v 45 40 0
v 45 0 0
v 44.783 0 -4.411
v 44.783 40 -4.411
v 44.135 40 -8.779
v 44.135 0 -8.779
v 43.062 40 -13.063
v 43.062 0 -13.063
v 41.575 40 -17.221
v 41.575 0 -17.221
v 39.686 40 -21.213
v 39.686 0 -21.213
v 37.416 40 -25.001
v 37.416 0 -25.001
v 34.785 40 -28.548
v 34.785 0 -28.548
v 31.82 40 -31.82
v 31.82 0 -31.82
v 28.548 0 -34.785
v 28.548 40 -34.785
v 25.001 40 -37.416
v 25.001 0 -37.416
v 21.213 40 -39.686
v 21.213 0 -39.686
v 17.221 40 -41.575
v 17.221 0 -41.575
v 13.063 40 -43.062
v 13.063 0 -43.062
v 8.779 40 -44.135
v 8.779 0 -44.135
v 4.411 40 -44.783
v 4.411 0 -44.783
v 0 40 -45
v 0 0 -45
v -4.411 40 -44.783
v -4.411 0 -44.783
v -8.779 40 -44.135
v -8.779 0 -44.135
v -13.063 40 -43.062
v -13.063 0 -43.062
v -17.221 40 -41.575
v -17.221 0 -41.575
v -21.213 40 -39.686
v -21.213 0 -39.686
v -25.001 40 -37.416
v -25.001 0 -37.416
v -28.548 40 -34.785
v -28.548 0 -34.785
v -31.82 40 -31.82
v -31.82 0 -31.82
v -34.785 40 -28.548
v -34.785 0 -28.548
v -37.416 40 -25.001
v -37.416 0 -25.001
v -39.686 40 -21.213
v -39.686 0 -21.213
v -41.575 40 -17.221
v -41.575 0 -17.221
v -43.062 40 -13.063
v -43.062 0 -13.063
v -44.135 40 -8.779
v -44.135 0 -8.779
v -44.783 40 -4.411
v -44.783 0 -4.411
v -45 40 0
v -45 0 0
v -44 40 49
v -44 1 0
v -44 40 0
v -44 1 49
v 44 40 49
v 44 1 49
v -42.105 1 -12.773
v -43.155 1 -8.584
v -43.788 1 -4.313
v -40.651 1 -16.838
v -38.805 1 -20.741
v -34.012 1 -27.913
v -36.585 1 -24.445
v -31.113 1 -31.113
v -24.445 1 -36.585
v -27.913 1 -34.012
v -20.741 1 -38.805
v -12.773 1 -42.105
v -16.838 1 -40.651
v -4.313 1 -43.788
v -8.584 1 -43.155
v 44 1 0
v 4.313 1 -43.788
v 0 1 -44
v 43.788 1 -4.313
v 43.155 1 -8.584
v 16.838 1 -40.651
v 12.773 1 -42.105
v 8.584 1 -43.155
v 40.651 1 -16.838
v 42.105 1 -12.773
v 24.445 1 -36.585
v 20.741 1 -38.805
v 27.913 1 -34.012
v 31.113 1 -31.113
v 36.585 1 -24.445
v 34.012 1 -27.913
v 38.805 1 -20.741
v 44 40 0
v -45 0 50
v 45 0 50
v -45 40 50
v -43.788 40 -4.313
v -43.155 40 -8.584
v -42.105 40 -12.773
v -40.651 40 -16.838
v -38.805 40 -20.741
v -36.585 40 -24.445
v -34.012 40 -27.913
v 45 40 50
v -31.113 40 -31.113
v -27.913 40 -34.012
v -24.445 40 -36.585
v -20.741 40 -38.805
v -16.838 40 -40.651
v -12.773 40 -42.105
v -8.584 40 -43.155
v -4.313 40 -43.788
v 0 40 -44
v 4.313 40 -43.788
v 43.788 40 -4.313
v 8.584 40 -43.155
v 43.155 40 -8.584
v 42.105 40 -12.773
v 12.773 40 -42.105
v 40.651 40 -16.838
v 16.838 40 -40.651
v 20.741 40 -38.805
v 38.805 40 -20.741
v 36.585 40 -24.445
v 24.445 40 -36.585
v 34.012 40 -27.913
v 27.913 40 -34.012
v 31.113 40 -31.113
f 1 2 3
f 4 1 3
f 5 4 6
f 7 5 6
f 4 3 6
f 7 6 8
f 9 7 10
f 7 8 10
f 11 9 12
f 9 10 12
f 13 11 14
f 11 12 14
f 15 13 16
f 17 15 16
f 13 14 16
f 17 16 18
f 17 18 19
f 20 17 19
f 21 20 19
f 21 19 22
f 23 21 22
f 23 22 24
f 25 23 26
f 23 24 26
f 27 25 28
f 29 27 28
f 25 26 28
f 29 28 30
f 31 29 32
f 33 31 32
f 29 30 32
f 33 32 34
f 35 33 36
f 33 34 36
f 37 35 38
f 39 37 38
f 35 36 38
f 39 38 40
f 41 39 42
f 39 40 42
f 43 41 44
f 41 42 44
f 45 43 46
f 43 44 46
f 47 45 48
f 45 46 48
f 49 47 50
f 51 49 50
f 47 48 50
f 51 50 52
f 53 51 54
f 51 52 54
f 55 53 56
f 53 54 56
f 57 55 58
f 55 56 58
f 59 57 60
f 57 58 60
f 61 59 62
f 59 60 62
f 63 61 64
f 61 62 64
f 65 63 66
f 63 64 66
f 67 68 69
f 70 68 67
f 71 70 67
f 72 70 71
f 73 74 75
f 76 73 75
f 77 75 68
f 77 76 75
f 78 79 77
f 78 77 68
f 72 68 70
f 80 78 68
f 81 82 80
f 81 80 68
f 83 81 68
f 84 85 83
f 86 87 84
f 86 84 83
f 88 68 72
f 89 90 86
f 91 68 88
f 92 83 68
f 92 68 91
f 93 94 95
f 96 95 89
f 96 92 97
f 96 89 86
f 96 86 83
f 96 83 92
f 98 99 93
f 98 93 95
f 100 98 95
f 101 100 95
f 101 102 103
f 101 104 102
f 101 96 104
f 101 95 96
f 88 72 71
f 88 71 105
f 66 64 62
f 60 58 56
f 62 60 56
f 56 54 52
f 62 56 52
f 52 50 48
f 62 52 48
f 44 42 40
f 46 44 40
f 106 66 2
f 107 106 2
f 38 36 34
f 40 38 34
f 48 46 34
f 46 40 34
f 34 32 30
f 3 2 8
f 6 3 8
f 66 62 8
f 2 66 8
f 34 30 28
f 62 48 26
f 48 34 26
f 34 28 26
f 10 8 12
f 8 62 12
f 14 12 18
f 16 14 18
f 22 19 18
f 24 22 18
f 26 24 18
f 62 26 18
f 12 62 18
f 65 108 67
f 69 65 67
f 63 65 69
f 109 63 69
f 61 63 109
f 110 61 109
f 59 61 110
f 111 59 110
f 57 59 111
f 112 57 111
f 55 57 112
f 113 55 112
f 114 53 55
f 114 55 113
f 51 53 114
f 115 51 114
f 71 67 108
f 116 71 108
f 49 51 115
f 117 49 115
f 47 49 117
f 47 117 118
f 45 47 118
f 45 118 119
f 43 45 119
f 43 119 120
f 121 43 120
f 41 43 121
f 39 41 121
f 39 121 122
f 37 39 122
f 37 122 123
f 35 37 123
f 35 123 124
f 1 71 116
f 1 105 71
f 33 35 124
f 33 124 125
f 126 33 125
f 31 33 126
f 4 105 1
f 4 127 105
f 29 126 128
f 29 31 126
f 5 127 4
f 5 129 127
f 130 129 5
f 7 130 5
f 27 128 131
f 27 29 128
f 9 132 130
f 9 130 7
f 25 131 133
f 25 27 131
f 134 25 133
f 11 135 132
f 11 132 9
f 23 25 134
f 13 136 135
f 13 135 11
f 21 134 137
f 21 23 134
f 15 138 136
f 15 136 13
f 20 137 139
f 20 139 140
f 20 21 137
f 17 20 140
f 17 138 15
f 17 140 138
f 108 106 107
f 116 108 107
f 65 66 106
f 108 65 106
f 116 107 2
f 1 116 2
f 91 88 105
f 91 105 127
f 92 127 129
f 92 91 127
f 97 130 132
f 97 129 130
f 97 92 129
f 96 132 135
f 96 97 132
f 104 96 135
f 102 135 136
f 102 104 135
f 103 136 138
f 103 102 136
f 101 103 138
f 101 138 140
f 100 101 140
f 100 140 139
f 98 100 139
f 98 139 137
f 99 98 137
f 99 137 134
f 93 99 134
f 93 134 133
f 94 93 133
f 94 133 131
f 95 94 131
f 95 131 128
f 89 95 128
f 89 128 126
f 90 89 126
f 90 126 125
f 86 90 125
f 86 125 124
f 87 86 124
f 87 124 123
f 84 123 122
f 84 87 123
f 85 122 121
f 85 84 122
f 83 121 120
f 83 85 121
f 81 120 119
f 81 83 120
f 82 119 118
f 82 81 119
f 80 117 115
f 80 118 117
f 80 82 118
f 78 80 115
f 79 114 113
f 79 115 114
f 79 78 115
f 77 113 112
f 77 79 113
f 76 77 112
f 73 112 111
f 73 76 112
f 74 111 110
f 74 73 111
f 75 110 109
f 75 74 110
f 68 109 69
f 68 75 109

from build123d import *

# Parameters (mm, degrees)
BOSS_EXTRUDE1_DEPTH = 40
SHELL1_T            = -1


with BuildPart() as part:
    # Sketch1 → Boss-Extrude1 (new body)
    with BuildSketch(Plane(origin=(0, 0, 0), x_dir=(1, 0, 0), z_dir=(0, 1, 0))):
        with BuildLine():
            Line((-45, 0), (-45, -50))
            Line((-45, -50), (45, -50))
            Line((45, -50), (45, 0))
            ThreePointArc((45, 0), (0, 45), (-45, 0))
        make_face()
    extrude(amount=BOSS_EXTRUDE1_DEPTH)

    # Shell1
    shell1_openings = [part.faces().sort_by_distance(p)[0] for p in [
        (0, 40, 13.75),
    ]]
    offset(amount=SHELL1_T, openings=shell1_openings, kind=Kind.INTERSECTION)


solid = part.part
